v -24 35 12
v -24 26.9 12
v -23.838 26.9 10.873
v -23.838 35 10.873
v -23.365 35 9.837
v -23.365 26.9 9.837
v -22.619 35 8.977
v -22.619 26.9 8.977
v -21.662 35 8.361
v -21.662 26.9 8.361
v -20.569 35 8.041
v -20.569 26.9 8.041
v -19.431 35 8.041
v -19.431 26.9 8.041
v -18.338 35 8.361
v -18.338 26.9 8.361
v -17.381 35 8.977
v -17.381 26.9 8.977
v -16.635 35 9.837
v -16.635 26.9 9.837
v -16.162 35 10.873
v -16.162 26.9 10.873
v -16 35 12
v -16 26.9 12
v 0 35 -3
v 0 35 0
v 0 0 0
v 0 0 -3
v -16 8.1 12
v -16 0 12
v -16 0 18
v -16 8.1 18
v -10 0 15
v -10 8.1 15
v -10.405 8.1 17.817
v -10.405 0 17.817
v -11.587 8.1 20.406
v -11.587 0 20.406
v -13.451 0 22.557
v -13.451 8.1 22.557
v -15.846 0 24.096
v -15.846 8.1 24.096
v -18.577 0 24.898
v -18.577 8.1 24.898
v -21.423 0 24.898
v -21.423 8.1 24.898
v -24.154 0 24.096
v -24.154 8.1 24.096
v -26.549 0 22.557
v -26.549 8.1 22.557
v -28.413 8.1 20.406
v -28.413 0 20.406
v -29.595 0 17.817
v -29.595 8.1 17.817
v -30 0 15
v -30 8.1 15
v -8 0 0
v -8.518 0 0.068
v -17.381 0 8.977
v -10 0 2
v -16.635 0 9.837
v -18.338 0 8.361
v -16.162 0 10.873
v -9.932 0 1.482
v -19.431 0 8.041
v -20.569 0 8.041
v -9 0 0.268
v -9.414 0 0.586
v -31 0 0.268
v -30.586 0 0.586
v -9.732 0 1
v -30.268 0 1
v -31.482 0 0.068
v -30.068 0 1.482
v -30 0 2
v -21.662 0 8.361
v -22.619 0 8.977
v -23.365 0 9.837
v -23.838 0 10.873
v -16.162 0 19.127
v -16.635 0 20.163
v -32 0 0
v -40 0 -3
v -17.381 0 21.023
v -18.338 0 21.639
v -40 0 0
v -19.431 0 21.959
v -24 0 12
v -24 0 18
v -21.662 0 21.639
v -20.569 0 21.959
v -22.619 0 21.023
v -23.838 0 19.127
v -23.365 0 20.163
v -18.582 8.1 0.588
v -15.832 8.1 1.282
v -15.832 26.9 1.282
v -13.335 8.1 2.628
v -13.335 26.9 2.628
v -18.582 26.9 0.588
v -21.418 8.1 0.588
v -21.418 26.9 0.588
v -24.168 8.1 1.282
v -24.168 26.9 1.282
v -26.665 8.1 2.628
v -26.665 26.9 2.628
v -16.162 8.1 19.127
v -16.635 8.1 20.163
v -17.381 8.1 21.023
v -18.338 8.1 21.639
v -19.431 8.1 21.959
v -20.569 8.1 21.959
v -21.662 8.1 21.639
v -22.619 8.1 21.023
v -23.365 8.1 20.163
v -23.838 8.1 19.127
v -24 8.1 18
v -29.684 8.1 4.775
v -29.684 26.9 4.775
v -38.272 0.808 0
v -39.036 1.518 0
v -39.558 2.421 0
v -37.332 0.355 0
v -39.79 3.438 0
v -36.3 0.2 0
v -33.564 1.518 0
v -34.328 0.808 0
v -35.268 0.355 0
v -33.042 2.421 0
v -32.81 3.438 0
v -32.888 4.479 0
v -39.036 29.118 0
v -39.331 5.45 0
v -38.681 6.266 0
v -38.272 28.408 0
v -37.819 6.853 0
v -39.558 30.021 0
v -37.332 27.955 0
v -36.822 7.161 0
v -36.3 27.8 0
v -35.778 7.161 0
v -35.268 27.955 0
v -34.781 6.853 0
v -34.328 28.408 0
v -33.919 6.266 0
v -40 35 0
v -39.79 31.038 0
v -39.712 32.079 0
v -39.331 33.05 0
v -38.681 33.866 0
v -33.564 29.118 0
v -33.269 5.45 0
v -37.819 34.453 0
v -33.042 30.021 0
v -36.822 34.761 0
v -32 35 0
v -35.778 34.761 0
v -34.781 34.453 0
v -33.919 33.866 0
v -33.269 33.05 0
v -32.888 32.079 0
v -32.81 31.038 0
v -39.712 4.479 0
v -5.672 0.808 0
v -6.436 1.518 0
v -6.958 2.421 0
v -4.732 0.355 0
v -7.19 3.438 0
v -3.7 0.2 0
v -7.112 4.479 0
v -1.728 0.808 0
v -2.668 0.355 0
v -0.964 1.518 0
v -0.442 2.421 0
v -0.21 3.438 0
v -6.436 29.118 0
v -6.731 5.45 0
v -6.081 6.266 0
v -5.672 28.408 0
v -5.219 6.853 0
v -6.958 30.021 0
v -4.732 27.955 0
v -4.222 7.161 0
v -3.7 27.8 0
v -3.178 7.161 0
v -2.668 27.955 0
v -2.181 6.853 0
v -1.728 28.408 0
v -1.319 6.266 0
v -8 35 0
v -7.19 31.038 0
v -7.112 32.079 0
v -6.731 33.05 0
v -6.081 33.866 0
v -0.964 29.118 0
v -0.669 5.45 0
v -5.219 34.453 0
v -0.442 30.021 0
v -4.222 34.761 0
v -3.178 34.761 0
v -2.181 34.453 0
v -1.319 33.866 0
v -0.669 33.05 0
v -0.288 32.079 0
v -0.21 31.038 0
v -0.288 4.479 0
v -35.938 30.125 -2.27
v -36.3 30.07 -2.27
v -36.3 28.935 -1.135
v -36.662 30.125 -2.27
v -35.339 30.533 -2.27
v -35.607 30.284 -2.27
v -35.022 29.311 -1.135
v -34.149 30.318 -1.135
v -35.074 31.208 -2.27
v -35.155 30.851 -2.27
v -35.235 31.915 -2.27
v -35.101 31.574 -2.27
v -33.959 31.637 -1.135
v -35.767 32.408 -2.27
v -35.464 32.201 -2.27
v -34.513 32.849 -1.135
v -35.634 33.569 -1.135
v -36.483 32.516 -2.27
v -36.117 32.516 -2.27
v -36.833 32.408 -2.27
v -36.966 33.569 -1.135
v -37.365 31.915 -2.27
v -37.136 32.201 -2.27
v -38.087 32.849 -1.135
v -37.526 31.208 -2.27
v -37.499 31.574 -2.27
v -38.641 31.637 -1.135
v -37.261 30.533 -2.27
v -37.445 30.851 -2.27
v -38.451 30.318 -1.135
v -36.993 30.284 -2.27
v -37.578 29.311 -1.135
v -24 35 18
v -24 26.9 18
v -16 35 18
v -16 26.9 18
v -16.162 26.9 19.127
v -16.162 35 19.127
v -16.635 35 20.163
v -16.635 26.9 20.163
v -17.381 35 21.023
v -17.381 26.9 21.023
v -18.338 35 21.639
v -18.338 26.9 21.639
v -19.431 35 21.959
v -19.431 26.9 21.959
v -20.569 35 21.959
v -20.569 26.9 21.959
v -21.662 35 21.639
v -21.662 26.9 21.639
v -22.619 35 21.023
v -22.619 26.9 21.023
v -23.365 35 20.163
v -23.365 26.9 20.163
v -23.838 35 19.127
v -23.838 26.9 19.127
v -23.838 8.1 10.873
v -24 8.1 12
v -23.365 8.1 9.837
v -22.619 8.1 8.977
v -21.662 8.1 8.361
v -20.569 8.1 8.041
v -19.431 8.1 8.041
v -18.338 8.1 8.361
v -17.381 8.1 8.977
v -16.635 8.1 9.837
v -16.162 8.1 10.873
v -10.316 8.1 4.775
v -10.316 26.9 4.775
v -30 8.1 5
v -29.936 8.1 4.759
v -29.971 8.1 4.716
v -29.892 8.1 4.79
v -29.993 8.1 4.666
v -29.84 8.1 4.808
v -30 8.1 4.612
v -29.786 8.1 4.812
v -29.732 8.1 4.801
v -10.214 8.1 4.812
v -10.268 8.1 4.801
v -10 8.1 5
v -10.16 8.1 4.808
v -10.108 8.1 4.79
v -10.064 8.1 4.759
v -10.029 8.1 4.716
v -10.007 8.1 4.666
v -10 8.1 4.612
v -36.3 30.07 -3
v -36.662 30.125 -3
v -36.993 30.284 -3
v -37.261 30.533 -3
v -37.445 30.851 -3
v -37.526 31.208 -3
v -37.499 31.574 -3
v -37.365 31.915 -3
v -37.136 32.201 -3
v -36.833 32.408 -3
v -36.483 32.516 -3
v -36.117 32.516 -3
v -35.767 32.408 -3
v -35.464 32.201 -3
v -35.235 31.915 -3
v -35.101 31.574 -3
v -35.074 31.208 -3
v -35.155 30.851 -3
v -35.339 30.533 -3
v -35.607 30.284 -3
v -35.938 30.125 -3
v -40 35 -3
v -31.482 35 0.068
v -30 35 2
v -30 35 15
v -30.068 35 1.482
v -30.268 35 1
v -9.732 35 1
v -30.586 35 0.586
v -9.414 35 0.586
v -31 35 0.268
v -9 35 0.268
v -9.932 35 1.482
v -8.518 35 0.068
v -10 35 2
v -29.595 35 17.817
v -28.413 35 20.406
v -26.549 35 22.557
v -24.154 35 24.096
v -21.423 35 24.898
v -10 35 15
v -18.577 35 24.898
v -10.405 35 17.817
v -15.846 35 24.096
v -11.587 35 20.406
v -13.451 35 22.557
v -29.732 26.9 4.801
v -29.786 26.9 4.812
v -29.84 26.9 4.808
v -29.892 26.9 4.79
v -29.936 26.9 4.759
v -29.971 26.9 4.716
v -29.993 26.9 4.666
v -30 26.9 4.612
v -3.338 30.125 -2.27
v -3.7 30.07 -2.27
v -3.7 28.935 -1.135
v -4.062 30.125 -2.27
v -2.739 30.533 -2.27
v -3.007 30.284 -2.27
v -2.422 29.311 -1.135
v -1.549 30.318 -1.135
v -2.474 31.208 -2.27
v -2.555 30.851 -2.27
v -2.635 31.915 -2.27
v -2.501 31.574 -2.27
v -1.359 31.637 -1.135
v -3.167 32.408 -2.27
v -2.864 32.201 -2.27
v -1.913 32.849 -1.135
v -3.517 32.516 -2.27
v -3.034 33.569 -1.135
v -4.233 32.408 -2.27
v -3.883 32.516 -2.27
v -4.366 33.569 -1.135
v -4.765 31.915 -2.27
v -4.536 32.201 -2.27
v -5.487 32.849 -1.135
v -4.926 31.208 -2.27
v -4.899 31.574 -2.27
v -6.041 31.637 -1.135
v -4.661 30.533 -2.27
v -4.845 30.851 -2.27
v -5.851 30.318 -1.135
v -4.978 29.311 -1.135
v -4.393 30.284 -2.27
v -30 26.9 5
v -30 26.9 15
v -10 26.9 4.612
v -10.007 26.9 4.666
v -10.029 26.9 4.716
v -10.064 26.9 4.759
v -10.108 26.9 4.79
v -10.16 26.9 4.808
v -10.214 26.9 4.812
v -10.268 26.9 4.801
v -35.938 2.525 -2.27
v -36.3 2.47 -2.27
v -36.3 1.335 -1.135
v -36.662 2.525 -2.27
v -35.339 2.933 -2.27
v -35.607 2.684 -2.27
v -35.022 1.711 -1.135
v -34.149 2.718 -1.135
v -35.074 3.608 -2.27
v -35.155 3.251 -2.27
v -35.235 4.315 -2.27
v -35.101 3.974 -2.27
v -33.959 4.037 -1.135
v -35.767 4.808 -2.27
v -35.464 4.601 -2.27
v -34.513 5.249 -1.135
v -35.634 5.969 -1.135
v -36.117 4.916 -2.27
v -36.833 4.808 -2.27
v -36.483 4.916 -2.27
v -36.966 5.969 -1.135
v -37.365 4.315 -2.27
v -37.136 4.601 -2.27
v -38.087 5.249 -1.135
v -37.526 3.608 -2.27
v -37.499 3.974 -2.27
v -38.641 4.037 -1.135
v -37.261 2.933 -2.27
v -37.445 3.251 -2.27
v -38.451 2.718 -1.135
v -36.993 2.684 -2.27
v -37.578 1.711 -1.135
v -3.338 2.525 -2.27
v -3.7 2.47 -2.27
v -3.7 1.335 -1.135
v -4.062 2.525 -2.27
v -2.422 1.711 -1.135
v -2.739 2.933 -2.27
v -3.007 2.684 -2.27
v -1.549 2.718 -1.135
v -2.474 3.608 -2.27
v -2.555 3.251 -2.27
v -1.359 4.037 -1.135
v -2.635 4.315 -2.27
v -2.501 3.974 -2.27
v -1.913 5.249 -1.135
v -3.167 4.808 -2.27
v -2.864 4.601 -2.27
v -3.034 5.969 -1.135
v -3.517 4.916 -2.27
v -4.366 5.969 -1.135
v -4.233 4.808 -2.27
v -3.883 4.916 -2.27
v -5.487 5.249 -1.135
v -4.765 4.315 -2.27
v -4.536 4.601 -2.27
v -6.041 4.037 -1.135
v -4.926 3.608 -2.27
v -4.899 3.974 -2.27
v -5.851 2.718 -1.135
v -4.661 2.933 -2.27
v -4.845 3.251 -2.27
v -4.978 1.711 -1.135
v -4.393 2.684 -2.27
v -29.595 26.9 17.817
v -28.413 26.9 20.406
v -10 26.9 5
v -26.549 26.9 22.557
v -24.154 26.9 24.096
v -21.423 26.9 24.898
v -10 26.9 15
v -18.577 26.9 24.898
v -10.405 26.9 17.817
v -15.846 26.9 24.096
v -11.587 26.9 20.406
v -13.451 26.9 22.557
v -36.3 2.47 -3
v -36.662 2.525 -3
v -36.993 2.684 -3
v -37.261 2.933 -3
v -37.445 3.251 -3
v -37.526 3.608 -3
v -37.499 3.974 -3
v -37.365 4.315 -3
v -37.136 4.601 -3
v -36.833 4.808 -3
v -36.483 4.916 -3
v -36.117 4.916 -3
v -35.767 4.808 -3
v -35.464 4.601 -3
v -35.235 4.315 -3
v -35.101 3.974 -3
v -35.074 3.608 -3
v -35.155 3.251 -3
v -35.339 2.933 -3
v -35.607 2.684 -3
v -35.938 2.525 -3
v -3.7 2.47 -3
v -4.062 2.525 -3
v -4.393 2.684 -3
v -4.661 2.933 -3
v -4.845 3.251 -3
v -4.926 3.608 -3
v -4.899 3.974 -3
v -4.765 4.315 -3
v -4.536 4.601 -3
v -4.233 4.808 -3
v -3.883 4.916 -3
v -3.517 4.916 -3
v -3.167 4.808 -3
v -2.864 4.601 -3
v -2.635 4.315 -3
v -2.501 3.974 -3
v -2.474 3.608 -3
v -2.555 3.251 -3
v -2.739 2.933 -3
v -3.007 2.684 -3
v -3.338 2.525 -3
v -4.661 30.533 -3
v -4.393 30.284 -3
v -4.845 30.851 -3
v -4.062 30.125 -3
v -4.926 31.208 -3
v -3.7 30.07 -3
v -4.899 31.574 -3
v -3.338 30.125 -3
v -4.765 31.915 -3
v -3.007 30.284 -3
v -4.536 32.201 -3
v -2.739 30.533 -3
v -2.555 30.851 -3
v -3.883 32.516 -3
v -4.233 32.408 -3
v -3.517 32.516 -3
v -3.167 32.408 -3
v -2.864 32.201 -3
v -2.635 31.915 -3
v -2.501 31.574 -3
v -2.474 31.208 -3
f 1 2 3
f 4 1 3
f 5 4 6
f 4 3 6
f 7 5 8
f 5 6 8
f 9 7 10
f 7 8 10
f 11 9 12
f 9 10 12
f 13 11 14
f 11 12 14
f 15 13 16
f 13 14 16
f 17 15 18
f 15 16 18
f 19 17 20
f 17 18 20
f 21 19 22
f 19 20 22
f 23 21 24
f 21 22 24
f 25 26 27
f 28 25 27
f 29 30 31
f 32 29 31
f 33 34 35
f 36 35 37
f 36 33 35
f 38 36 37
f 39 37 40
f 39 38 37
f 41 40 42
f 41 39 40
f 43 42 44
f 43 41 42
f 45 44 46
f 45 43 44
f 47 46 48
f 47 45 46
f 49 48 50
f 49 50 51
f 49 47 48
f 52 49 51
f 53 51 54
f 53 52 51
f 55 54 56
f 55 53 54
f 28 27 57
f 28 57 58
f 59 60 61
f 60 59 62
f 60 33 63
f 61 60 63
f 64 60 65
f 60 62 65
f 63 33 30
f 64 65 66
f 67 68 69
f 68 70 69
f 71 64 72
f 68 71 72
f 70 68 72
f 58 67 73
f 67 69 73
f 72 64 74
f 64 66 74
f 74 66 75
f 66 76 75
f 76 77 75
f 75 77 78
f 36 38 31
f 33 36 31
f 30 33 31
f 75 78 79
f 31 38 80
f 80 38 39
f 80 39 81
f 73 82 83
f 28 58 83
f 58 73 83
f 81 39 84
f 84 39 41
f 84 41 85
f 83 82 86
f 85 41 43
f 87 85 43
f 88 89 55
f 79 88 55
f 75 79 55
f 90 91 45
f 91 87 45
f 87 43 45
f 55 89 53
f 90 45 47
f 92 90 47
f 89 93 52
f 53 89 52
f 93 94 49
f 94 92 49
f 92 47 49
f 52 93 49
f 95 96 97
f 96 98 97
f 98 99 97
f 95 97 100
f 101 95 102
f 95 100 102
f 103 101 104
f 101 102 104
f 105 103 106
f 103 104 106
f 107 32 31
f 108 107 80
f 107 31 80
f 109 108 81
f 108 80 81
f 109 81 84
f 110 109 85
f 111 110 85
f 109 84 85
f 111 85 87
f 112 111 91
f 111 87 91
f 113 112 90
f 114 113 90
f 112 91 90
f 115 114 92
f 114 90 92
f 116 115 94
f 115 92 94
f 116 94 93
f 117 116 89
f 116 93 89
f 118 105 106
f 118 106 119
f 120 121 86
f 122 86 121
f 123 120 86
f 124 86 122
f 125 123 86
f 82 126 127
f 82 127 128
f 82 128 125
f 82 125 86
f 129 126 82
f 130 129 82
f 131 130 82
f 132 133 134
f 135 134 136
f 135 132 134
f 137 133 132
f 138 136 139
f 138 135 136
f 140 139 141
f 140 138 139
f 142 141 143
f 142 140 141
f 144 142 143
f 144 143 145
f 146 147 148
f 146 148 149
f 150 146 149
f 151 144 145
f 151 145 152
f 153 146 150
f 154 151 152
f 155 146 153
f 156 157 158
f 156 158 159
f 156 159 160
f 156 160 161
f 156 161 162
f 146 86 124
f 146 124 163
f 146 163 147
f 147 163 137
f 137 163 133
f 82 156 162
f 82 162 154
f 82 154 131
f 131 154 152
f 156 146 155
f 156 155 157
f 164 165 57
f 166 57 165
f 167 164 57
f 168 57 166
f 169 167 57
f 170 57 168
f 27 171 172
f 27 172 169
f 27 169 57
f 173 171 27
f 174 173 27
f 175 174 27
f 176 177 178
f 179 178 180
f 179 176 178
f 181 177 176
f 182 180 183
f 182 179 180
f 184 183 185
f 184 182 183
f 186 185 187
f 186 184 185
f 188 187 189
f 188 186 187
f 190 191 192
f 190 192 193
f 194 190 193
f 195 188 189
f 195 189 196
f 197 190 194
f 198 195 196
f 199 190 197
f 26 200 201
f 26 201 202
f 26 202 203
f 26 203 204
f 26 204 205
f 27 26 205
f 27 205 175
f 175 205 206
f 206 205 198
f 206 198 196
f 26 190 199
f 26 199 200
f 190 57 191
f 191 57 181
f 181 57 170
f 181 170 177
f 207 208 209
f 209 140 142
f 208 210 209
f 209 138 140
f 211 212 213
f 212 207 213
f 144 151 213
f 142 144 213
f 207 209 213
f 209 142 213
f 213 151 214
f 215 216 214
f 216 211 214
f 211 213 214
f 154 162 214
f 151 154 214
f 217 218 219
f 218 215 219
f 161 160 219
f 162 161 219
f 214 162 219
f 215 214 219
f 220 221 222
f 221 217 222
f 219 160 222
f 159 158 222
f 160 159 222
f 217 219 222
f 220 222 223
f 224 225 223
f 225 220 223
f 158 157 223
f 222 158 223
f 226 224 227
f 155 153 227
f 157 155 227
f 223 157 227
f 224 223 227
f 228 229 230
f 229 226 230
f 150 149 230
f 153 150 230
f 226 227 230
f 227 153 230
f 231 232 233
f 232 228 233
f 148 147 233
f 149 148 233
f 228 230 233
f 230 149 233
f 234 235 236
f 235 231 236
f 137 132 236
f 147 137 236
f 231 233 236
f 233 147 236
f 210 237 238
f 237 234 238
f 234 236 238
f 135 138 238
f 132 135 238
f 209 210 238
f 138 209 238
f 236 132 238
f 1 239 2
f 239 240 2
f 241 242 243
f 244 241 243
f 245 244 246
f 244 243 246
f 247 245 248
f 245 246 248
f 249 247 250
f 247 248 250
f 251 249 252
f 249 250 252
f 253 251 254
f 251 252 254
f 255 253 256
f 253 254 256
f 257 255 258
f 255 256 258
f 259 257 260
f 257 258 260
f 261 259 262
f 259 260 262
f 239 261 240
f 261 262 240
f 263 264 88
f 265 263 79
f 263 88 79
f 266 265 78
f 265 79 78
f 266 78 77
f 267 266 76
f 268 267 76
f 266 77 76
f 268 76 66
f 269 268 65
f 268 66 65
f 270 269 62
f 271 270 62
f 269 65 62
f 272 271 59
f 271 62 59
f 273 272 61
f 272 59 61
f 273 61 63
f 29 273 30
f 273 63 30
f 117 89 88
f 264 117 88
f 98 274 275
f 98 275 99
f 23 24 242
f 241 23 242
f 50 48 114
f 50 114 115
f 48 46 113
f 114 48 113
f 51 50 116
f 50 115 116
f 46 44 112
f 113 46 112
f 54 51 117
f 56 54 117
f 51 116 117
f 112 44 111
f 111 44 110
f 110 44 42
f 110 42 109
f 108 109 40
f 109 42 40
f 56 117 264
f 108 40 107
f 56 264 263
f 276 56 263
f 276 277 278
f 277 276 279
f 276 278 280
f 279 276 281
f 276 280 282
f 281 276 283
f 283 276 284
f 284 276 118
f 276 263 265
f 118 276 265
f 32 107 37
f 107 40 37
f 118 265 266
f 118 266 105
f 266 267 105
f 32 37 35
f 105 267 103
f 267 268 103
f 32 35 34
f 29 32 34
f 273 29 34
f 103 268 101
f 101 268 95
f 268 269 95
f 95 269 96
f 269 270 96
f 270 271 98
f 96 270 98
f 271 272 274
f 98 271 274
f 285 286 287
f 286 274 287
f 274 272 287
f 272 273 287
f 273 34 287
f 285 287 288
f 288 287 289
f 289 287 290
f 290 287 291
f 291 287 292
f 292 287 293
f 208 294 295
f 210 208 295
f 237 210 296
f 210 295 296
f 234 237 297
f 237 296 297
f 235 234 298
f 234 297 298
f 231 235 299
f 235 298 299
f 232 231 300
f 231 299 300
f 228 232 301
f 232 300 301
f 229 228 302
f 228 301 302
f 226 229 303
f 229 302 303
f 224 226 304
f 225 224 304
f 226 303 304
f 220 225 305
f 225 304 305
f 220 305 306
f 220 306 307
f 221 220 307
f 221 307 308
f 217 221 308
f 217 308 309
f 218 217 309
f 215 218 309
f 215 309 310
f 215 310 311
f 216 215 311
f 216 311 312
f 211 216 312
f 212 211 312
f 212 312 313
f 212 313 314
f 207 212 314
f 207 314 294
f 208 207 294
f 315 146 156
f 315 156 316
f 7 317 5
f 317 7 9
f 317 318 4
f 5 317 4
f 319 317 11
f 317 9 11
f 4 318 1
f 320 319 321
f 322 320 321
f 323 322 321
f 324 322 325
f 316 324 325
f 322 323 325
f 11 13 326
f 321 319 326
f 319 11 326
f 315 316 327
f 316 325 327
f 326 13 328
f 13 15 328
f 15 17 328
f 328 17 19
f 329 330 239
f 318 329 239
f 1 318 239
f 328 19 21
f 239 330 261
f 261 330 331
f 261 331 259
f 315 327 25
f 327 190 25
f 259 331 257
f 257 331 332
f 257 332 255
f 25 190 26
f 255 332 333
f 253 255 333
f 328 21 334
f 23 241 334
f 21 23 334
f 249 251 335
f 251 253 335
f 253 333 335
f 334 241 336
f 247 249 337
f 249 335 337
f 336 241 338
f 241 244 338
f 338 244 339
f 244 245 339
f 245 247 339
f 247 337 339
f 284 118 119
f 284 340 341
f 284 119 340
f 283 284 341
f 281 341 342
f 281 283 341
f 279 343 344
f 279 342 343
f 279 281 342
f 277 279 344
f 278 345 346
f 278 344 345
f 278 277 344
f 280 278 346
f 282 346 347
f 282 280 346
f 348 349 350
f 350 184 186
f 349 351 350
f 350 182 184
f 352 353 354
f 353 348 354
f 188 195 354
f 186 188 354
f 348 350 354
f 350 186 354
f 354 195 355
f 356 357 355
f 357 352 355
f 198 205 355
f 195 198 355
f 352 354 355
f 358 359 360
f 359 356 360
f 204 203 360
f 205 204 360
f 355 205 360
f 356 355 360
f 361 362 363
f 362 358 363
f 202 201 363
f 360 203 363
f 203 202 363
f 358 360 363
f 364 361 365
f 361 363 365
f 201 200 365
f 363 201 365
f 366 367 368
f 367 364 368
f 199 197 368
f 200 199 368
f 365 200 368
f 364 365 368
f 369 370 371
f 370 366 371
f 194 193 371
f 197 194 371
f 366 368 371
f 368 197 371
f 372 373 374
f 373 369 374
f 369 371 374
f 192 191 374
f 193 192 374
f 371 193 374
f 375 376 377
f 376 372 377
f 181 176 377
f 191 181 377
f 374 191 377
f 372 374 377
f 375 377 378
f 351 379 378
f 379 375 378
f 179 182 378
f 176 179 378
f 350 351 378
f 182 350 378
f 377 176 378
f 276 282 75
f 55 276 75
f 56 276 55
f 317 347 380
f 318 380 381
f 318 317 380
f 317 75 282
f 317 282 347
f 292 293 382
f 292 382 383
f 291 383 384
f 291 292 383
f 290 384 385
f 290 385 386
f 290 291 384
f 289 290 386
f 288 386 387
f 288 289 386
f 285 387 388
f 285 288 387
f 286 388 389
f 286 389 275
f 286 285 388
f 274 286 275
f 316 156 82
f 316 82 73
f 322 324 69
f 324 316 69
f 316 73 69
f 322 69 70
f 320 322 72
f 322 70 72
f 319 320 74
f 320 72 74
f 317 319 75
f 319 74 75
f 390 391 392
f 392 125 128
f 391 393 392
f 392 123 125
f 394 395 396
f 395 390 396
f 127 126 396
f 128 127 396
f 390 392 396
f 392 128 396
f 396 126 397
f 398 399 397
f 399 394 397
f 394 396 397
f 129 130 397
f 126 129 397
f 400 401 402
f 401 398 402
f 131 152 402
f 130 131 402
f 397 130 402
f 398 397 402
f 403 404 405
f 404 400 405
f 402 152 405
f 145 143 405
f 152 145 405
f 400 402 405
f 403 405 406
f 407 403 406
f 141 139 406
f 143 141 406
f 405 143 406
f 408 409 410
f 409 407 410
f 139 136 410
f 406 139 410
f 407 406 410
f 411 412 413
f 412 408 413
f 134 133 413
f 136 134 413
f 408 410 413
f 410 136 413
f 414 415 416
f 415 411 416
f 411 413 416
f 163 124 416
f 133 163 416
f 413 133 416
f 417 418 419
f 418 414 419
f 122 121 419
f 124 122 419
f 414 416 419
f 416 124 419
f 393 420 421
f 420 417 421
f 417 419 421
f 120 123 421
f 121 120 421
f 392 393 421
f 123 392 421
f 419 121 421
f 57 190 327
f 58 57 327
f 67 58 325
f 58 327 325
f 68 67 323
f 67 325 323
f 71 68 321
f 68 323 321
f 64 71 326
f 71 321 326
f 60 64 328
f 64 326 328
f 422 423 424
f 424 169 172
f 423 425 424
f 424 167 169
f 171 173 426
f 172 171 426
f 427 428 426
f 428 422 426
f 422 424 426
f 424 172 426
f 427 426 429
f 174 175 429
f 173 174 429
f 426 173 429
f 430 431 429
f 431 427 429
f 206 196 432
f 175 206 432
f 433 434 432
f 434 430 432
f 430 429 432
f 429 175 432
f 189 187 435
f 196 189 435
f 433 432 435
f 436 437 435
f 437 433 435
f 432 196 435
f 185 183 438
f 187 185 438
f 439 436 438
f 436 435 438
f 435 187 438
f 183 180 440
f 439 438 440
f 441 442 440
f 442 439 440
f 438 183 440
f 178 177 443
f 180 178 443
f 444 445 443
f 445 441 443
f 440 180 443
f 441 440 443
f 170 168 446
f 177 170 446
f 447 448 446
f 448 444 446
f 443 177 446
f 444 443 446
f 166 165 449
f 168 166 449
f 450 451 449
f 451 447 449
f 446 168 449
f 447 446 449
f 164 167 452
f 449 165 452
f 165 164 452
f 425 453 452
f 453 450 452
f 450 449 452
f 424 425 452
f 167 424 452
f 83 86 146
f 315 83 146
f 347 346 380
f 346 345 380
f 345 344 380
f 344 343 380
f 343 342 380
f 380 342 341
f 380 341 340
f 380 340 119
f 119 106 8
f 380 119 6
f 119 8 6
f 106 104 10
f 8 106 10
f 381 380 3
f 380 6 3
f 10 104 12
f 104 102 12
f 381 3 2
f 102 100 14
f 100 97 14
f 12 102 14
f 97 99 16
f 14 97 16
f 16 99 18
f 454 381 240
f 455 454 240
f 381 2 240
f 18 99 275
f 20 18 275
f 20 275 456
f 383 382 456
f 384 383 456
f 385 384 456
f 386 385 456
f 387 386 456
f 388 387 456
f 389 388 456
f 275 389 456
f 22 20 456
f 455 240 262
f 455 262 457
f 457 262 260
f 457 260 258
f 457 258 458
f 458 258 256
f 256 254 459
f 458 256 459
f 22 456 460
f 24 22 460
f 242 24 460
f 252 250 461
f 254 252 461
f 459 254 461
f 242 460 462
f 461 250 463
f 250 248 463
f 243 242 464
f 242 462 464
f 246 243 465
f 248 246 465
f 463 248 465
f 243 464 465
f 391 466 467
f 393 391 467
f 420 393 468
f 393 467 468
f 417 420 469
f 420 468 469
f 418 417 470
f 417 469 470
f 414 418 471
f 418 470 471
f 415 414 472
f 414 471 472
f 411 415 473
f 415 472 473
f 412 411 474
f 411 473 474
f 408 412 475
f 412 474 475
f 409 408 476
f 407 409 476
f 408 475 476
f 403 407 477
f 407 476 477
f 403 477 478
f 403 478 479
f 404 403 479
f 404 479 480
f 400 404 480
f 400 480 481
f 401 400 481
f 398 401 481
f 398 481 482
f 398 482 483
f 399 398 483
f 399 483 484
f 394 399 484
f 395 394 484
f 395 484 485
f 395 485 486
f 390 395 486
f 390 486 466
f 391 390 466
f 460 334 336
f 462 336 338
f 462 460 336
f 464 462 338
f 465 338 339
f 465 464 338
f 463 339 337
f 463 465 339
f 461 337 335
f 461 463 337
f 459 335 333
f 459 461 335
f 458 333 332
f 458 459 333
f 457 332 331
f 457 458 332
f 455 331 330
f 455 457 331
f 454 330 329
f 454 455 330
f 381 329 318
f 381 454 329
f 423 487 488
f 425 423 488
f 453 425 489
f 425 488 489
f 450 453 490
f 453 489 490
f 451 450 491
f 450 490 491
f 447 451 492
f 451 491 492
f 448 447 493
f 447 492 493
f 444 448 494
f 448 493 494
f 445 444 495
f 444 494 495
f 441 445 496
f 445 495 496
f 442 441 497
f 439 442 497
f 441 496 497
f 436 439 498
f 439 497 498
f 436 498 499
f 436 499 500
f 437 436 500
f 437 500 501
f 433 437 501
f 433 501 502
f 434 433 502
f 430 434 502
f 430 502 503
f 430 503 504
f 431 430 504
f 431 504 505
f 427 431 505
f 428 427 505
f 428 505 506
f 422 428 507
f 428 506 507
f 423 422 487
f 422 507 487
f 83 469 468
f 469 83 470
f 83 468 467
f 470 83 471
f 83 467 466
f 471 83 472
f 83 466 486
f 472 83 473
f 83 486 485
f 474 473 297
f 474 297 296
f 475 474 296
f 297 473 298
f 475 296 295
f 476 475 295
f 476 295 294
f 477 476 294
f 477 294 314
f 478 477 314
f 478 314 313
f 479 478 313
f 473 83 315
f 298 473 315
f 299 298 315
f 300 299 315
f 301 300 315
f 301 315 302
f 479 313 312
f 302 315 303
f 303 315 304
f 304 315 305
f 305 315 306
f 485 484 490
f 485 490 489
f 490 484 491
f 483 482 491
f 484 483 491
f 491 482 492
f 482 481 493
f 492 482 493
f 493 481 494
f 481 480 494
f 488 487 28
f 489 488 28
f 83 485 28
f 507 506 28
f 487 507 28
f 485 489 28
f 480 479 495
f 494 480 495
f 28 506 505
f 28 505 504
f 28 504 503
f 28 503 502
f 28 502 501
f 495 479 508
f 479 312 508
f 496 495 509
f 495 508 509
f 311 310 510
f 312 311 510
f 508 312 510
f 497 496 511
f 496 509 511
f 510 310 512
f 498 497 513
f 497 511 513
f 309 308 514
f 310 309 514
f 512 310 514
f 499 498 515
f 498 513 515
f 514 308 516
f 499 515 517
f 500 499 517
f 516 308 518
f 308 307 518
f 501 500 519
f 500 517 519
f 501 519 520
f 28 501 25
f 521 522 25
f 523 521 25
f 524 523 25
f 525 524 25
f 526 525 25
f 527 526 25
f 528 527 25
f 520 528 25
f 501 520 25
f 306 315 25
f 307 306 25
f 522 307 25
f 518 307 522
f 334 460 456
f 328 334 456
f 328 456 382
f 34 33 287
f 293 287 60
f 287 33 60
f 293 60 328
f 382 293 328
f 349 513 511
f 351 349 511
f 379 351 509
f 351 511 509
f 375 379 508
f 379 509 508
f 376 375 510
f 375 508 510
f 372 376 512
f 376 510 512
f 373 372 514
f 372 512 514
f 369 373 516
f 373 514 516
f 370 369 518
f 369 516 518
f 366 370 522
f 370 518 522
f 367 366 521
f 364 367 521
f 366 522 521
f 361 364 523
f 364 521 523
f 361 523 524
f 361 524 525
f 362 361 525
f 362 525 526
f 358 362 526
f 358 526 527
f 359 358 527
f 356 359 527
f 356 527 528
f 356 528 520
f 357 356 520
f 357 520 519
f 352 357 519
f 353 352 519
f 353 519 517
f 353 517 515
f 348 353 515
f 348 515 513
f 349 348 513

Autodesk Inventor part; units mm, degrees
ref_plane "YZ Plane" through (0, 0, 0) normal (1, 0, 0) x (0, 1, 0)
ref_plane "XZ Plane" through (0, 0, 0) normal (0, 1, 0) x (-1, 0, 0)
ref_plane "XY Plane" through (0, 0, 0) normal (0, 0, 1) x (1, 0, 0)
sketch "Skizze3" plane through (0, 0, 0) normal (0, 0, 1) x (1, 0, 0)
  line L0 (0, 0) -> (-40, 0)
  line L1 (-40, 0) -> (-40, 35)
  line L2 (-40, 35) -> (0, 35)
  line L3 (0, 35) -> (0, 0)
  point P0 (-3.7, 3.7)
  dimension "d4" = 35
  dimension "d5" = 40
  dimension "d6" = 3.7
  dimension "d7" = 3.7
sketch "Skizze4" plane through (0, 0, 0) normal (0, 1, 0) x (-1, 0, 0)
  line L0 (0, 0) -> (40, 0) projected
  line L1 (20, 0) -> (20, 25)
  line L2 (20, 18) -> (20, 12) construction
  line L3 (24, 18) -> (24, 12)
  line L4 (16, 12) -> (16, 18)
  arc A0 (24, 18) -> (16, 18) centre (20, 18) ccw
  arc A1 (16, 12) -> (24, 12) centre (20, 12) ccw
  circle A2 centre (20, 15) radius 10
  line L5 (30, 15) -> (30, 0)
  line L6 (10, 15) -> (10, 0)
  dimension "d9" = 10
  dimension "d10" = 8
  dimension "d11" = 6
  dimension "d12" = 10
  dimension "d13" = 10
  dimension "d46" = 12
extrude "Extrusion3" add sketch "Skizze4" along normal blind 35 contours L6 A2 L1 L0 | L1 A2 L5 L0 | A2 L1 A0 L4 A1 | L1 A1 L3 A0 A2
extrude "Extrusion4" add sketch "Skizze3" against normal blind 3
hole "Bohrung1" at (-3.7, 3.7, 0) direction (0, 0, -1) diameter 2.459 depth 8.8 countersink diameter 7 countersink angle 90
sketch "Skizze5" plane through (0, 0, 0) normal (1, 0, 0) x (0, 0, -1)
  line L0 (-25, 0) -> (-25, 35) projected
  line L1 (-25, 8.1) -> (0, 8.1)
  line L2 (0, 8.1) -> (0, 26.9)
  line L3 (0, 26.9) -> (-25, 26.9)
  line L4 (-25, 26.9) -> (-25, 8.1)
  line L5 (0, 0) -> (0, 35) projected
  point P0 (-25, 17.5)
  point P1 (-25, 26.9)
  point P2 (0, 17.5)
  point P3 (0, 17.5)
  dimension "d25" = 18.8
extrude "Extrusion5" cut sketch "Skizze5" against normal through all
pattern_linear "Rechteckige Anordnung1" count 2 spacing 32.6 along (-1, 0, 0) count 2 spacing 27.6 along (0, 1, 0) of "Bohrung1"
sketch "Skizze6" plane through (-20, 26.9, 15) normal (0, -1, 0) x (1, 0, 0)
  line L0 (-10, -15) -> (-10, 0) projected
  line L1 (10, 0) -> (10, -15) projected
  line L2 (10, -15) -> (-10, -15) projected
  arc A0 (-4, -3) -> (4, -3) centre (0, -3) ccw projected
  arc A1 (10, 0) -> (-10, 0) centre (0, 0) ccw projected
  line L3 (10, 0) -> (10, -15) projected
  line L4 (-10, -15) -> (-10, 0) projected
  circle A2 centre (0, -3) radius 11.5
  line L5 (-6.6647, -12.3719) -> (-10, -10)
  line L6 (10, 0) -> (10, -15) projected
  line L7 (10, -10) -> (6.6647, -12.3719)
  point P0 (20, -15)
  point P1 (-10, -10)
  dimension "d47" = 23
  dimension "d48" = 5
  dimension "d49" = 5
extrude "Extrusion6" add sketch "Skizze6" along normal up to surface (18.8 mm away) contours L0 L5 A2 L7 L1 L2
fillet "Rundung4" radius 2 2 edges at (-10, 17.5, 0) (-30, 17.5, 0)
fillet "Rundung5" radius 0.2 2 edges at (-30, 17.5, 5) (-10, 17.5, 5)
equation "\"d7\" = d6"
equation "\"d13\" = d12"
equation "\"d14\" = d4"
equation "\"d31\" = d5 - 2 * d6"
equation "\"d34\" = d4 - 2 * d7"
properties part number "BT101_trajan20_21" material "Kunststoff, undurchsichtig Schwarz"
